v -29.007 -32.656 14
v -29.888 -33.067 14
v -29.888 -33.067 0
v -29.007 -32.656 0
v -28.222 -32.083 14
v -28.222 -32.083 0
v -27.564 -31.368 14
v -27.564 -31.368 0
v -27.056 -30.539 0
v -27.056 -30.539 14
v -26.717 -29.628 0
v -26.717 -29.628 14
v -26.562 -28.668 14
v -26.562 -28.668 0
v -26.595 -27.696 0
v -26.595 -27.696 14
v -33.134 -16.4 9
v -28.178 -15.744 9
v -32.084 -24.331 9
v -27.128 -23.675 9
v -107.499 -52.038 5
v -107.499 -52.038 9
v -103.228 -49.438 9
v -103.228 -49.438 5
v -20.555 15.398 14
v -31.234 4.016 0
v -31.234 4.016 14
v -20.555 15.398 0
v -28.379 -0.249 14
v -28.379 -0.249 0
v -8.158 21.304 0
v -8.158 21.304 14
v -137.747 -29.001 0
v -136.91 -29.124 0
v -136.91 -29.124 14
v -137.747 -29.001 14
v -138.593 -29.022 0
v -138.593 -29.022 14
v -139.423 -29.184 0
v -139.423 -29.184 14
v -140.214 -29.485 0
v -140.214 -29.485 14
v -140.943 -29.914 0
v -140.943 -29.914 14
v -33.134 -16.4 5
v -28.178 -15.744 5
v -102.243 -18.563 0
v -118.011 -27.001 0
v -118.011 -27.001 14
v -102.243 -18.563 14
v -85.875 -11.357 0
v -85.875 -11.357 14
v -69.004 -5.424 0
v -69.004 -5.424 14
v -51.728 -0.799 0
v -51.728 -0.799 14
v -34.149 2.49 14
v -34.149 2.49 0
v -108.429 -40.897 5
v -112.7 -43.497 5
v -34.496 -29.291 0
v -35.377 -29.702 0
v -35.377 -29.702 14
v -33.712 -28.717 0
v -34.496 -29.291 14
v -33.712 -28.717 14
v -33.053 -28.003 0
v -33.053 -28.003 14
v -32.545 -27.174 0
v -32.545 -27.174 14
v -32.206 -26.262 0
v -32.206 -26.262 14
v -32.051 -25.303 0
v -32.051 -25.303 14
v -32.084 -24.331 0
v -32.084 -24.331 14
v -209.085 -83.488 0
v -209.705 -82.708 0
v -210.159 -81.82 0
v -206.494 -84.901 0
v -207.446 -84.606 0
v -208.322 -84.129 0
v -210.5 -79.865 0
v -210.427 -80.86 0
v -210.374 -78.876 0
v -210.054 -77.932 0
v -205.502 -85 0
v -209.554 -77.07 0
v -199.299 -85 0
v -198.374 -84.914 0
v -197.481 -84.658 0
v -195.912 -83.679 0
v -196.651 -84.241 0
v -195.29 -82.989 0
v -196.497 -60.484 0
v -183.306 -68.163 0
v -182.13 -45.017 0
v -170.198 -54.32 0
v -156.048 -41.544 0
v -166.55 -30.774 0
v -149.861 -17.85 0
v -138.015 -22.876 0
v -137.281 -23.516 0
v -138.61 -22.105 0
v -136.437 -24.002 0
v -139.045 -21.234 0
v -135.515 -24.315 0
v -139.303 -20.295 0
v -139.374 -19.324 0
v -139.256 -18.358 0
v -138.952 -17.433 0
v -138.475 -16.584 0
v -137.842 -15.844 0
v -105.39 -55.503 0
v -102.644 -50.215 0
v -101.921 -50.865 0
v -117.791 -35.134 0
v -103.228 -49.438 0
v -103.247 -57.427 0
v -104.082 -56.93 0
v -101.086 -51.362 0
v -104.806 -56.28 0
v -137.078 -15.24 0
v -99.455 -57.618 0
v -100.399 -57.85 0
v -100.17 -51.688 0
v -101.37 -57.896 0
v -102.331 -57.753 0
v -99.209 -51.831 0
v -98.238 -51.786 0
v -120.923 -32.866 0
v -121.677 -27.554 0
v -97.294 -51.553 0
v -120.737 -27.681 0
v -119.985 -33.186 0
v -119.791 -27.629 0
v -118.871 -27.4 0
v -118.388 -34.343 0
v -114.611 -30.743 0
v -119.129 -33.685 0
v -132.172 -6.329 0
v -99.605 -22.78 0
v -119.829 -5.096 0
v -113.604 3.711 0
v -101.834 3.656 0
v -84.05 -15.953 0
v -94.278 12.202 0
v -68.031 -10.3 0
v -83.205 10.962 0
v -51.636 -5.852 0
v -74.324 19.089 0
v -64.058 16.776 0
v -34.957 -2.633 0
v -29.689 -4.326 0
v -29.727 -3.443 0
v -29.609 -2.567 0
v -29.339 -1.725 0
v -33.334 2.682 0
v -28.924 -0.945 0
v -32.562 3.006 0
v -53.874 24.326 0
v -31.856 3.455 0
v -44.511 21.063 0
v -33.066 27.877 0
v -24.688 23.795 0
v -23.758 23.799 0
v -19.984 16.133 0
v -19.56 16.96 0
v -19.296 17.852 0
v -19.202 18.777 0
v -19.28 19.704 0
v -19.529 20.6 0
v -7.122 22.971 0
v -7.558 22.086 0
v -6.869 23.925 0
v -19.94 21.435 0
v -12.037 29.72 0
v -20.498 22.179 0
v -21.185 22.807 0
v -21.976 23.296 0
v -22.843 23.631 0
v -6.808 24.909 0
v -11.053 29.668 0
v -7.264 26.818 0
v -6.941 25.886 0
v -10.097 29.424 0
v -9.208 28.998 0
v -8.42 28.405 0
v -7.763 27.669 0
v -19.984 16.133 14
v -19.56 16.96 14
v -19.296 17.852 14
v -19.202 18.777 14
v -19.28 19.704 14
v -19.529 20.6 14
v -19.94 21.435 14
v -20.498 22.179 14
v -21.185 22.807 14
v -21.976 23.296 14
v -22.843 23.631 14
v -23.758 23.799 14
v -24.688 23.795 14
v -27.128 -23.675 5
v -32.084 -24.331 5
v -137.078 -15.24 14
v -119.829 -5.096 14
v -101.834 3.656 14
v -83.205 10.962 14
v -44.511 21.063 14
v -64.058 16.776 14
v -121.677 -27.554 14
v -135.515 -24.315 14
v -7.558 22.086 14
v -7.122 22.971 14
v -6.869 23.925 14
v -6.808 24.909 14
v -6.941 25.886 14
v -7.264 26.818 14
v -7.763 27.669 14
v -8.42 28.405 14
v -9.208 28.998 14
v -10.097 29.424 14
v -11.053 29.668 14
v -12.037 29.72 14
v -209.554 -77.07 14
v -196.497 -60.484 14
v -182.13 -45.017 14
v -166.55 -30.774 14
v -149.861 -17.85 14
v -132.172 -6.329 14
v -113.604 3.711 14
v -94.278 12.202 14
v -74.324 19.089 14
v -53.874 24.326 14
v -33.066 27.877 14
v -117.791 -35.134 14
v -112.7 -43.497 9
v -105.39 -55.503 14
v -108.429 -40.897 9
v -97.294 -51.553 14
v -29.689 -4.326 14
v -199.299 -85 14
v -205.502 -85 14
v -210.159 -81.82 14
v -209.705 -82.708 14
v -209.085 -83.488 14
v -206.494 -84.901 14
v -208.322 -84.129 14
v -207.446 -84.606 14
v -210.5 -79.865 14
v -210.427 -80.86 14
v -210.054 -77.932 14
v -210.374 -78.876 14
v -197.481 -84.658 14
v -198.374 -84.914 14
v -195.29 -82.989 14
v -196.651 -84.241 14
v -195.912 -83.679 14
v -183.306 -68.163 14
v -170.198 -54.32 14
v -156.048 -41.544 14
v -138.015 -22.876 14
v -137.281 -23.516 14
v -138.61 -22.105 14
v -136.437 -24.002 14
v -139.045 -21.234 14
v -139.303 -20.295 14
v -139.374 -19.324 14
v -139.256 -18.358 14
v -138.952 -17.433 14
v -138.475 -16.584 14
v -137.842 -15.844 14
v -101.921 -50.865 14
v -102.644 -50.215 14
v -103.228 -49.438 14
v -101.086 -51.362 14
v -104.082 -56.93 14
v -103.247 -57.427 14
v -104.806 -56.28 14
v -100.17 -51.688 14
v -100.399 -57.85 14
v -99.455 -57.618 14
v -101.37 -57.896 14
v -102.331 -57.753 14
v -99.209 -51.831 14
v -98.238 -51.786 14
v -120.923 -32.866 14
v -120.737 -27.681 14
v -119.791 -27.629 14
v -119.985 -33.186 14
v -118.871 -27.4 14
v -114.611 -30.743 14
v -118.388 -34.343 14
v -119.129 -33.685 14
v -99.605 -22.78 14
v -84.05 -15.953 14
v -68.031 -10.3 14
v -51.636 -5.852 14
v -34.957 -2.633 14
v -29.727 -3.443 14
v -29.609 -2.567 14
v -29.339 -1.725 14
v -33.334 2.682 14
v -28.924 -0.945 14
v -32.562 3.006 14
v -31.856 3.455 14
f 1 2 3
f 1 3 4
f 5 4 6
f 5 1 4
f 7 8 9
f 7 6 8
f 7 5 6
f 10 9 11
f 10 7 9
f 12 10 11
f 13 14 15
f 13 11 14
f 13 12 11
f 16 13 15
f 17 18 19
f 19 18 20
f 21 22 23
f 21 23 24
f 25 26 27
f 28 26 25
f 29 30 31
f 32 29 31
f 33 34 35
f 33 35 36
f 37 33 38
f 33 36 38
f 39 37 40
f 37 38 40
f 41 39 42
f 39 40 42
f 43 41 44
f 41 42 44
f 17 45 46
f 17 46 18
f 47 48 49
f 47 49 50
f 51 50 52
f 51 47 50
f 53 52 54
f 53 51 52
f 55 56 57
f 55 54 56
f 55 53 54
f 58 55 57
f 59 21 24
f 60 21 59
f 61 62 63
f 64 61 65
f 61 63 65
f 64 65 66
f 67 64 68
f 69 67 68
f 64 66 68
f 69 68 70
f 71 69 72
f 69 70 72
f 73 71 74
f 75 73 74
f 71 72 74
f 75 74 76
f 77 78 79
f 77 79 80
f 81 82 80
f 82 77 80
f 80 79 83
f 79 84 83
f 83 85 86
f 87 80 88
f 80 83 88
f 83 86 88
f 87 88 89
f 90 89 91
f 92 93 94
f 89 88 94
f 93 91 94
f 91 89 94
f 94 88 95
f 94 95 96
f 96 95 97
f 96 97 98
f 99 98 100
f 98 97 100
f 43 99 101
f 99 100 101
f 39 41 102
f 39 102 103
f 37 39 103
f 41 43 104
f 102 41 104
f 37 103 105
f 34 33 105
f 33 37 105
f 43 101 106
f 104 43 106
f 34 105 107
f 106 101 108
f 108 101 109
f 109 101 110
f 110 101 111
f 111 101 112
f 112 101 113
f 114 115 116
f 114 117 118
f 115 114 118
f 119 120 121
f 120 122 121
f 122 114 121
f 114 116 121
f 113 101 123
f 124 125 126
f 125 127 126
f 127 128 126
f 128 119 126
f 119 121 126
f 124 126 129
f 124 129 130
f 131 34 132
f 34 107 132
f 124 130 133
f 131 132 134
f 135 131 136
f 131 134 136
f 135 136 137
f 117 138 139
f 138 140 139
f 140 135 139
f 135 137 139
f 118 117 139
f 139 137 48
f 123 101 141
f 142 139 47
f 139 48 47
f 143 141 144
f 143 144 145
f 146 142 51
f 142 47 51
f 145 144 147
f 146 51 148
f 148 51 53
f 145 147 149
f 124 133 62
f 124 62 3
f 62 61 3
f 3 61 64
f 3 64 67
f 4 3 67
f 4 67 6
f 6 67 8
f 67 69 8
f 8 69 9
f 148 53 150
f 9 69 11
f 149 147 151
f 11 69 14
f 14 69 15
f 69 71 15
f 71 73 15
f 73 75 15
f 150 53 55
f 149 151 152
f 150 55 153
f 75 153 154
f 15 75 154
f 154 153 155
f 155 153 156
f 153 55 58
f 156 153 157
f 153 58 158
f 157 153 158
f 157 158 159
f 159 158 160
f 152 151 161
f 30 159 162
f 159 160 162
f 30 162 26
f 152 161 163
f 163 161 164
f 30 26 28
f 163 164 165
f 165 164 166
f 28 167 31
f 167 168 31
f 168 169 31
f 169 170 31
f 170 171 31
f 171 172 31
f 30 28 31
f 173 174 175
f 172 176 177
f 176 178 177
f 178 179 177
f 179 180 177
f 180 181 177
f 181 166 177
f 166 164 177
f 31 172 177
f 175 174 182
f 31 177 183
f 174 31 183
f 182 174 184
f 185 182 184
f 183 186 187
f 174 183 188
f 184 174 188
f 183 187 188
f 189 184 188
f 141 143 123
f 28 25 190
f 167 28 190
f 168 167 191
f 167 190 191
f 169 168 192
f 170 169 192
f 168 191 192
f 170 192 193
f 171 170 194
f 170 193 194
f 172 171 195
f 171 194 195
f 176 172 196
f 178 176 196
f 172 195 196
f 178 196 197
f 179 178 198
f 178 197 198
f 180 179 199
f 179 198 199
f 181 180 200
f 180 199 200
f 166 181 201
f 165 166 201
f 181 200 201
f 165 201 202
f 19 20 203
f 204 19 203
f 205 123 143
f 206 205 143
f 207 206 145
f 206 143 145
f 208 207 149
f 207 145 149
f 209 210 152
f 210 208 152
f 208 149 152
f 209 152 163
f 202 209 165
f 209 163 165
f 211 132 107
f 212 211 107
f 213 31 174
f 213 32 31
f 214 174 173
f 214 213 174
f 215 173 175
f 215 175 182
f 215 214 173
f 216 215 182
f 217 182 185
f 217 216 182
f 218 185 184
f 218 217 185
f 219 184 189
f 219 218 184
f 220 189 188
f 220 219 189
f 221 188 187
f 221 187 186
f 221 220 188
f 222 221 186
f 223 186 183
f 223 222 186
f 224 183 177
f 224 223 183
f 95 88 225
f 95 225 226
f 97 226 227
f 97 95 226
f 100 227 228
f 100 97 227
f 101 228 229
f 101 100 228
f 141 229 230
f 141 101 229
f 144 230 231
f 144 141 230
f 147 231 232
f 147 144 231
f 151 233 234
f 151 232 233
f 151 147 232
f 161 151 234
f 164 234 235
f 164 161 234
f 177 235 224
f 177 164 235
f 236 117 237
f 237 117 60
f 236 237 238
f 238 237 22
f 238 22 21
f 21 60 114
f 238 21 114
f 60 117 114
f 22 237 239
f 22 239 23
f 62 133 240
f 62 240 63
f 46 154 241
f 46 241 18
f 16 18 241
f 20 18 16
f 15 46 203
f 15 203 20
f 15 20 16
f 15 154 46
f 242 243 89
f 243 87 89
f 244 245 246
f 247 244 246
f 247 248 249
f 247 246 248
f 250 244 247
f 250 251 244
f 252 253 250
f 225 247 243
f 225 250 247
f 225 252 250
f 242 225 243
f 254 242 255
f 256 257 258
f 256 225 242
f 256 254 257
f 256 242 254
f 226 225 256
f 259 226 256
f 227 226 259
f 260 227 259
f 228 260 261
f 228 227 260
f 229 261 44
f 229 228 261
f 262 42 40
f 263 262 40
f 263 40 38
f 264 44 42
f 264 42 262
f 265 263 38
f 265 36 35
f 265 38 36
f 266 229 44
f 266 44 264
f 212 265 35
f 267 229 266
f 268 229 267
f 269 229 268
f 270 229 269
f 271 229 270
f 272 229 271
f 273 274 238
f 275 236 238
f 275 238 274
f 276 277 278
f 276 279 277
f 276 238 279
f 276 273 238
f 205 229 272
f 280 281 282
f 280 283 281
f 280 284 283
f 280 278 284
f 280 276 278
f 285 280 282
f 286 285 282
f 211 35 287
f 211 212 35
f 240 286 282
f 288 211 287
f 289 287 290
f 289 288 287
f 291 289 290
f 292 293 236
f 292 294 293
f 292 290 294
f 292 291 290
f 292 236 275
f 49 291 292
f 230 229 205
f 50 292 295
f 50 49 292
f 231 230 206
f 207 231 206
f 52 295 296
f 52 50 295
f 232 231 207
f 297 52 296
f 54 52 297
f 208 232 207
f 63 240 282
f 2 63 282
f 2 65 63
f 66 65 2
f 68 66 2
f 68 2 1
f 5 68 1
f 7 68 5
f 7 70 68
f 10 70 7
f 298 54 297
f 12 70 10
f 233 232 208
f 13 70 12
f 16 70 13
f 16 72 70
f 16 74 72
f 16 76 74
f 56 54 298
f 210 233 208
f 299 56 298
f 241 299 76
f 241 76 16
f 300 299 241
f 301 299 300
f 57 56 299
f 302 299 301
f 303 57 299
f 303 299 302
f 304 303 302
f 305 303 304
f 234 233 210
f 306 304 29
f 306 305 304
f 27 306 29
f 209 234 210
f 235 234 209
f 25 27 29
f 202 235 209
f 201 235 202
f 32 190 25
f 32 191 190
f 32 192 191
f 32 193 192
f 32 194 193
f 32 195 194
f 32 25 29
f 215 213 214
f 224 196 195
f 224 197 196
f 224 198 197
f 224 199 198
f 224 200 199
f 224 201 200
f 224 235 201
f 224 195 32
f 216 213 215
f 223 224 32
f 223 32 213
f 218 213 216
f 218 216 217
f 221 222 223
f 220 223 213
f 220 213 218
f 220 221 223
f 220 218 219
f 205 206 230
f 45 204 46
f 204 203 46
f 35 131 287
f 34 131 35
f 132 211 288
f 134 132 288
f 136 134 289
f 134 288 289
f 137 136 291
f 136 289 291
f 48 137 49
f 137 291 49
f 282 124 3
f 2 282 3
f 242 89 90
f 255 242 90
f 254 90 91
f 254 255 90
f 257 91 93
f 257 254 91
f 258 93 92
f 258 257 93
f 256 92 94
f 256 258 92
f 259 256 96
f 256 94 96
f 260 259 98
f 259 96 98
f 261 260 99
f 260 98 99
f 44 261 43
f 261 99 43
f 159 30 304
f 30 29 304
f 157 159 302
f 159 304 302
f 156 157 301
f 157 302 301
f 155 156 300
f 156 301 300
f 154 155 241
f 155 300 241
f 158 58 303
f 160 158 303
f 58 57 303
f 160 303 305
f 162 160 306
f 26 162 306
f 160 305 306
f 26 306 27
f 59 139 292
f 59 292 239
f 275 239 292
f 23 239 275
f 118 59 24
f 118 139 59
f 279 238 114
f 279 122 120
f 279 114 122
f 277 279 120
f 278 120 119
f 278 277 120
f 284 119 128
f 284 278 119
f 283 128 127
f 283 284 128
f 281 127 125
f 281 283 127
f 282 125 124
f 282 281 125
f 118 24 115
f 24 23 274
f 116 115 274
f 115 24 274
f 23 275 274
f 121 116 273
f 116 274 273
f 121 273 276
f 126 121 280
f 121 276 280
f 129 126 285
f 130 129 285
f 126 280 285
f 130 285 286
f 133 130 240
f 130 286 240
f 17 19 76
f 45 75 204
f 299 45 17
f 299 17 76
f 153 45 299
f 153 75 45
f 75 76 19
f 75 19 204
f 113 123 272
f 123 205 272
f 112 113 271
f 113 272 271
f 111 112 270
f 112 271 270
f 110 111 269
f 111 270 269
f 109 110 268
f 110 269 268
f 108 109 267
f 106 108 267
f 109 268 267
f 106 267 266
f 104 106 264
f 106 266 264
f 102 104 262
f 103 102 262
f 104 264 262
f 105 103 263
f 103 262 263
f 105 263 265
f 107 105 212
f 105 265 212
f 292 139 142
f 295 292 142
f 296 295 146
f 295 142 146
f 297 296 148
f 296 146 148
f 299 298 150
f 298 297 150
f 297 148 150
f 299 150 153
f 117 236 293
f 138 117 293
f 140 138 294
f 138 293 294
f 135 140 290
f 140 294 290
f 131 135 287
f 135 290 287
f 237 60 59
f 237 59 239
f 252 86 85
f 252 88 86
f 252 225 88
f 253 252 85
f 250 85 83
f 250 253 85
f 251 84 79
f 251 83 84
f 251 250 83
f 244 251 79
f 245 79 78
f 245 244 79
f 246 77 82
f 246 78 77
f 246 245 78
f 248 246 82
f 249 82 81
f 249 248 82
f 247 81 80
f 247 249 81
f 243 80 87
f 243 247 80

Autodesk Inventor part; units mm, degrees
ref_plane "YZ Plane" through (0, 0, 0) normal (1, 0, 0) x (0, 1, 0)
ref_plane "XZ Plane" through (0, 0, 0) normal (0, 1, 0) x (-1, 0, 0)
ref_plane "XY Plane" through (0, 0, 0) normal (0, 0, 1) x (1, 0, 0)
sketch "Sketch1" plane through (0, 0, 0) normal (0, 0, 1) x (1, 0, 0)
  circle A0 centre (0, -228.6) radius 228.6 construction
  line L0 (0, 0) -> (0, 15) construction
  line L1 (0, 15) -> (-3, 15) construction
  line L2 (0, 0) -> (-100, 0) construction
  line L3 (0, 0) -> (0, -85) construction
  line L4 (0, 15) -> (0, 30) construction
  line L5 (0, -85) -> (-177.8679, -85) construction
  line L6 (-177.8679, -85) -> (-196.774, -85) construction
  circle A1 centre (0, -228.6) radius 243.6 construction
  circle A2 centre (0, -228.6) radius 258.6 construction
  arc A3 (0, 30) -> (-215.0651, -85) centre (0, -228.6) ccw
  line L7 (-30, -1.9771) -> (0, 30)
  line L8 (-118.8814, -33.3433) -> (-139.0909, -28.6133)
  line L9 (-196.774, -85) -> (-215.0651, -85) construction
  line L10 (-215.0651, -85) -> (-196.774, -85)
  arc A4 (-139.0909, -28.6133) -> (-196.774, -85) centre (0, -228.6) ccw
  circle A5 centre (0, -228.6) radius 233.6 construction
  circle A6 centre (0, -228.6) radius 253.6 construction
  line L11 (-119.7215, -28.0115) -> (-146.6573, -21.7073)
  line L12 (-32.4328, 2.7376) -> (-11.8047, 24.7251)
  arc A7 (-32.4328, 2.7376) -> (-119.7215, -28.0115) centre (0, -228.6) ccw
  arc A8 (-11.8047, 24.7251) -> (-146.6573, -21.7073) centre (0, -228.6) ccw
  line L13 (-118.8814, -33.3433) -> (0, -228.6) construction
  line L14 (-30, -1.9771) -> (0, -228.6) construction
  line L15 (-118.8814, -33.3433) -> (-103.2801, -58.9675)
  line L16 (-30, -1.9771) -> (-26.063, -31.7176)
  line L17 (-103.2801, -58.9675) -> (-26.063, -31.7176)
  line L18 (-114.6107, -30.7431) -> (-101.1189, -52.9026)
  line L19 (-101.1189, -52.9026) -> (-31.5521, -28.3525)
  line L20 (-31.5521, -28.3525) -> (-34.9568, -2.6332)
  arc A9 (-34.9568, -2.6332) -> (-114.6107, -30.7431) centre (0, -228.6) ccw
  dimension "d2" = 457.2
  dimension "d3" = 228.6
  dimension "d6" = 3
  dimension "d7" = 100
  dimension "d9" = 85
  dimension "d13" = 15
  dimension "d14" = 15
  dimension "d18" = 30
  dimension "d21" = 120
  dimension "d22" = 20.2095
  dimension "d23" = 467.2
  dimension "d24" = 507.2
  dimension "d25" = 5
  dimension "d26" = 5
  dimension "d27" = 30
  dimension "d28" = 30
  dimension "d29" = 5
  dimension "d30" = 228.6547
extrude "Extrusion1" add sketch "Sketch1" along normal blind 14
fillet "Fillet1" radius 5 14 edges at (-30, -1.9771, 7) (-118.8814, -33.3433, 7) (-139.0909, -28.6133, 7) (-11.8047, 24.7251, 7) (-146.6573, -21.7073, 7) (0, 30, 7) (-32.4328, 2.7376, 7) (-101.1189, -52.9026, 7) (-31.5521, -28.3525, 7) (-119.7215, -28.0115, 7) (-196.774, -85, 7) (-215.0651, -85, 7) (-26.063, -31.7176, 7) (-103.2801, -58.9675, 7)
sketch "Sketch2" plane through (-26.5953, -27.6963, 14) normal (0.9914, 0.1312, 0) x (0, 0, -1)
  line L0 (5, 4.0564) -> (9, 4.0564)
  line L1 (9, 4.0564) -> (9, 12.0564)
  line L2 (9, 12.0564) -> (5, 12.0564)
  line L3 (5, 12.0564) -> (5, 4.0564)
  line L4 (14, 0) -> (14, 23.5741) projected
  line L5 (0, 0) -> (0, 23.5741) projected
  line L6 (5, 12.0564) -> (9, 12.0564)
  line L7 (5, 4.0564) -> (9, 4.0564)
  line L8 (0, 4.0564) -> (14, 4.0564) projected
  point P0 (14, 23.9666)
  dimension "d34" = 5
  dimension "d35" = 5
  dimension "d46" = 8
extrude "Extrusion2" cut sketch "Sketch2" against normal blind 5
sketch "Sketch3" plane through (-105.3896, -55.5028, 0) normal (-0.8541, -0.52, 0) x (0, 0, 1)
  line L0 (9, 14.0564) -> (9, 4.0564)
  line L1 (9, 4.0564) -> (5, 4.0564)
  line L2 (0, 4.0564) -> (14, 4.0564) projected
  line L3 (5, 14.0564) -> (9, 14.0564)
  line L4 (14, 4.0564) -> (14, 25.9436) projected
  line L5 (5, 4.0564) -> (5, 14.0564)
  line L6 (0, 25.9436) -> (0, 4.0564) projected
  point P0 (0, -7.3997)
  dimension "d38" = 5
  dimension "d39" = 5
  dimension "d40" = 10
  dimension "d41" = 10
  dimension "d42" = 90
extrude "Extrusion3" cut sketch "Sketch3" against normal blind 5
properties part number "Bumper" material "ABS Plastic"
